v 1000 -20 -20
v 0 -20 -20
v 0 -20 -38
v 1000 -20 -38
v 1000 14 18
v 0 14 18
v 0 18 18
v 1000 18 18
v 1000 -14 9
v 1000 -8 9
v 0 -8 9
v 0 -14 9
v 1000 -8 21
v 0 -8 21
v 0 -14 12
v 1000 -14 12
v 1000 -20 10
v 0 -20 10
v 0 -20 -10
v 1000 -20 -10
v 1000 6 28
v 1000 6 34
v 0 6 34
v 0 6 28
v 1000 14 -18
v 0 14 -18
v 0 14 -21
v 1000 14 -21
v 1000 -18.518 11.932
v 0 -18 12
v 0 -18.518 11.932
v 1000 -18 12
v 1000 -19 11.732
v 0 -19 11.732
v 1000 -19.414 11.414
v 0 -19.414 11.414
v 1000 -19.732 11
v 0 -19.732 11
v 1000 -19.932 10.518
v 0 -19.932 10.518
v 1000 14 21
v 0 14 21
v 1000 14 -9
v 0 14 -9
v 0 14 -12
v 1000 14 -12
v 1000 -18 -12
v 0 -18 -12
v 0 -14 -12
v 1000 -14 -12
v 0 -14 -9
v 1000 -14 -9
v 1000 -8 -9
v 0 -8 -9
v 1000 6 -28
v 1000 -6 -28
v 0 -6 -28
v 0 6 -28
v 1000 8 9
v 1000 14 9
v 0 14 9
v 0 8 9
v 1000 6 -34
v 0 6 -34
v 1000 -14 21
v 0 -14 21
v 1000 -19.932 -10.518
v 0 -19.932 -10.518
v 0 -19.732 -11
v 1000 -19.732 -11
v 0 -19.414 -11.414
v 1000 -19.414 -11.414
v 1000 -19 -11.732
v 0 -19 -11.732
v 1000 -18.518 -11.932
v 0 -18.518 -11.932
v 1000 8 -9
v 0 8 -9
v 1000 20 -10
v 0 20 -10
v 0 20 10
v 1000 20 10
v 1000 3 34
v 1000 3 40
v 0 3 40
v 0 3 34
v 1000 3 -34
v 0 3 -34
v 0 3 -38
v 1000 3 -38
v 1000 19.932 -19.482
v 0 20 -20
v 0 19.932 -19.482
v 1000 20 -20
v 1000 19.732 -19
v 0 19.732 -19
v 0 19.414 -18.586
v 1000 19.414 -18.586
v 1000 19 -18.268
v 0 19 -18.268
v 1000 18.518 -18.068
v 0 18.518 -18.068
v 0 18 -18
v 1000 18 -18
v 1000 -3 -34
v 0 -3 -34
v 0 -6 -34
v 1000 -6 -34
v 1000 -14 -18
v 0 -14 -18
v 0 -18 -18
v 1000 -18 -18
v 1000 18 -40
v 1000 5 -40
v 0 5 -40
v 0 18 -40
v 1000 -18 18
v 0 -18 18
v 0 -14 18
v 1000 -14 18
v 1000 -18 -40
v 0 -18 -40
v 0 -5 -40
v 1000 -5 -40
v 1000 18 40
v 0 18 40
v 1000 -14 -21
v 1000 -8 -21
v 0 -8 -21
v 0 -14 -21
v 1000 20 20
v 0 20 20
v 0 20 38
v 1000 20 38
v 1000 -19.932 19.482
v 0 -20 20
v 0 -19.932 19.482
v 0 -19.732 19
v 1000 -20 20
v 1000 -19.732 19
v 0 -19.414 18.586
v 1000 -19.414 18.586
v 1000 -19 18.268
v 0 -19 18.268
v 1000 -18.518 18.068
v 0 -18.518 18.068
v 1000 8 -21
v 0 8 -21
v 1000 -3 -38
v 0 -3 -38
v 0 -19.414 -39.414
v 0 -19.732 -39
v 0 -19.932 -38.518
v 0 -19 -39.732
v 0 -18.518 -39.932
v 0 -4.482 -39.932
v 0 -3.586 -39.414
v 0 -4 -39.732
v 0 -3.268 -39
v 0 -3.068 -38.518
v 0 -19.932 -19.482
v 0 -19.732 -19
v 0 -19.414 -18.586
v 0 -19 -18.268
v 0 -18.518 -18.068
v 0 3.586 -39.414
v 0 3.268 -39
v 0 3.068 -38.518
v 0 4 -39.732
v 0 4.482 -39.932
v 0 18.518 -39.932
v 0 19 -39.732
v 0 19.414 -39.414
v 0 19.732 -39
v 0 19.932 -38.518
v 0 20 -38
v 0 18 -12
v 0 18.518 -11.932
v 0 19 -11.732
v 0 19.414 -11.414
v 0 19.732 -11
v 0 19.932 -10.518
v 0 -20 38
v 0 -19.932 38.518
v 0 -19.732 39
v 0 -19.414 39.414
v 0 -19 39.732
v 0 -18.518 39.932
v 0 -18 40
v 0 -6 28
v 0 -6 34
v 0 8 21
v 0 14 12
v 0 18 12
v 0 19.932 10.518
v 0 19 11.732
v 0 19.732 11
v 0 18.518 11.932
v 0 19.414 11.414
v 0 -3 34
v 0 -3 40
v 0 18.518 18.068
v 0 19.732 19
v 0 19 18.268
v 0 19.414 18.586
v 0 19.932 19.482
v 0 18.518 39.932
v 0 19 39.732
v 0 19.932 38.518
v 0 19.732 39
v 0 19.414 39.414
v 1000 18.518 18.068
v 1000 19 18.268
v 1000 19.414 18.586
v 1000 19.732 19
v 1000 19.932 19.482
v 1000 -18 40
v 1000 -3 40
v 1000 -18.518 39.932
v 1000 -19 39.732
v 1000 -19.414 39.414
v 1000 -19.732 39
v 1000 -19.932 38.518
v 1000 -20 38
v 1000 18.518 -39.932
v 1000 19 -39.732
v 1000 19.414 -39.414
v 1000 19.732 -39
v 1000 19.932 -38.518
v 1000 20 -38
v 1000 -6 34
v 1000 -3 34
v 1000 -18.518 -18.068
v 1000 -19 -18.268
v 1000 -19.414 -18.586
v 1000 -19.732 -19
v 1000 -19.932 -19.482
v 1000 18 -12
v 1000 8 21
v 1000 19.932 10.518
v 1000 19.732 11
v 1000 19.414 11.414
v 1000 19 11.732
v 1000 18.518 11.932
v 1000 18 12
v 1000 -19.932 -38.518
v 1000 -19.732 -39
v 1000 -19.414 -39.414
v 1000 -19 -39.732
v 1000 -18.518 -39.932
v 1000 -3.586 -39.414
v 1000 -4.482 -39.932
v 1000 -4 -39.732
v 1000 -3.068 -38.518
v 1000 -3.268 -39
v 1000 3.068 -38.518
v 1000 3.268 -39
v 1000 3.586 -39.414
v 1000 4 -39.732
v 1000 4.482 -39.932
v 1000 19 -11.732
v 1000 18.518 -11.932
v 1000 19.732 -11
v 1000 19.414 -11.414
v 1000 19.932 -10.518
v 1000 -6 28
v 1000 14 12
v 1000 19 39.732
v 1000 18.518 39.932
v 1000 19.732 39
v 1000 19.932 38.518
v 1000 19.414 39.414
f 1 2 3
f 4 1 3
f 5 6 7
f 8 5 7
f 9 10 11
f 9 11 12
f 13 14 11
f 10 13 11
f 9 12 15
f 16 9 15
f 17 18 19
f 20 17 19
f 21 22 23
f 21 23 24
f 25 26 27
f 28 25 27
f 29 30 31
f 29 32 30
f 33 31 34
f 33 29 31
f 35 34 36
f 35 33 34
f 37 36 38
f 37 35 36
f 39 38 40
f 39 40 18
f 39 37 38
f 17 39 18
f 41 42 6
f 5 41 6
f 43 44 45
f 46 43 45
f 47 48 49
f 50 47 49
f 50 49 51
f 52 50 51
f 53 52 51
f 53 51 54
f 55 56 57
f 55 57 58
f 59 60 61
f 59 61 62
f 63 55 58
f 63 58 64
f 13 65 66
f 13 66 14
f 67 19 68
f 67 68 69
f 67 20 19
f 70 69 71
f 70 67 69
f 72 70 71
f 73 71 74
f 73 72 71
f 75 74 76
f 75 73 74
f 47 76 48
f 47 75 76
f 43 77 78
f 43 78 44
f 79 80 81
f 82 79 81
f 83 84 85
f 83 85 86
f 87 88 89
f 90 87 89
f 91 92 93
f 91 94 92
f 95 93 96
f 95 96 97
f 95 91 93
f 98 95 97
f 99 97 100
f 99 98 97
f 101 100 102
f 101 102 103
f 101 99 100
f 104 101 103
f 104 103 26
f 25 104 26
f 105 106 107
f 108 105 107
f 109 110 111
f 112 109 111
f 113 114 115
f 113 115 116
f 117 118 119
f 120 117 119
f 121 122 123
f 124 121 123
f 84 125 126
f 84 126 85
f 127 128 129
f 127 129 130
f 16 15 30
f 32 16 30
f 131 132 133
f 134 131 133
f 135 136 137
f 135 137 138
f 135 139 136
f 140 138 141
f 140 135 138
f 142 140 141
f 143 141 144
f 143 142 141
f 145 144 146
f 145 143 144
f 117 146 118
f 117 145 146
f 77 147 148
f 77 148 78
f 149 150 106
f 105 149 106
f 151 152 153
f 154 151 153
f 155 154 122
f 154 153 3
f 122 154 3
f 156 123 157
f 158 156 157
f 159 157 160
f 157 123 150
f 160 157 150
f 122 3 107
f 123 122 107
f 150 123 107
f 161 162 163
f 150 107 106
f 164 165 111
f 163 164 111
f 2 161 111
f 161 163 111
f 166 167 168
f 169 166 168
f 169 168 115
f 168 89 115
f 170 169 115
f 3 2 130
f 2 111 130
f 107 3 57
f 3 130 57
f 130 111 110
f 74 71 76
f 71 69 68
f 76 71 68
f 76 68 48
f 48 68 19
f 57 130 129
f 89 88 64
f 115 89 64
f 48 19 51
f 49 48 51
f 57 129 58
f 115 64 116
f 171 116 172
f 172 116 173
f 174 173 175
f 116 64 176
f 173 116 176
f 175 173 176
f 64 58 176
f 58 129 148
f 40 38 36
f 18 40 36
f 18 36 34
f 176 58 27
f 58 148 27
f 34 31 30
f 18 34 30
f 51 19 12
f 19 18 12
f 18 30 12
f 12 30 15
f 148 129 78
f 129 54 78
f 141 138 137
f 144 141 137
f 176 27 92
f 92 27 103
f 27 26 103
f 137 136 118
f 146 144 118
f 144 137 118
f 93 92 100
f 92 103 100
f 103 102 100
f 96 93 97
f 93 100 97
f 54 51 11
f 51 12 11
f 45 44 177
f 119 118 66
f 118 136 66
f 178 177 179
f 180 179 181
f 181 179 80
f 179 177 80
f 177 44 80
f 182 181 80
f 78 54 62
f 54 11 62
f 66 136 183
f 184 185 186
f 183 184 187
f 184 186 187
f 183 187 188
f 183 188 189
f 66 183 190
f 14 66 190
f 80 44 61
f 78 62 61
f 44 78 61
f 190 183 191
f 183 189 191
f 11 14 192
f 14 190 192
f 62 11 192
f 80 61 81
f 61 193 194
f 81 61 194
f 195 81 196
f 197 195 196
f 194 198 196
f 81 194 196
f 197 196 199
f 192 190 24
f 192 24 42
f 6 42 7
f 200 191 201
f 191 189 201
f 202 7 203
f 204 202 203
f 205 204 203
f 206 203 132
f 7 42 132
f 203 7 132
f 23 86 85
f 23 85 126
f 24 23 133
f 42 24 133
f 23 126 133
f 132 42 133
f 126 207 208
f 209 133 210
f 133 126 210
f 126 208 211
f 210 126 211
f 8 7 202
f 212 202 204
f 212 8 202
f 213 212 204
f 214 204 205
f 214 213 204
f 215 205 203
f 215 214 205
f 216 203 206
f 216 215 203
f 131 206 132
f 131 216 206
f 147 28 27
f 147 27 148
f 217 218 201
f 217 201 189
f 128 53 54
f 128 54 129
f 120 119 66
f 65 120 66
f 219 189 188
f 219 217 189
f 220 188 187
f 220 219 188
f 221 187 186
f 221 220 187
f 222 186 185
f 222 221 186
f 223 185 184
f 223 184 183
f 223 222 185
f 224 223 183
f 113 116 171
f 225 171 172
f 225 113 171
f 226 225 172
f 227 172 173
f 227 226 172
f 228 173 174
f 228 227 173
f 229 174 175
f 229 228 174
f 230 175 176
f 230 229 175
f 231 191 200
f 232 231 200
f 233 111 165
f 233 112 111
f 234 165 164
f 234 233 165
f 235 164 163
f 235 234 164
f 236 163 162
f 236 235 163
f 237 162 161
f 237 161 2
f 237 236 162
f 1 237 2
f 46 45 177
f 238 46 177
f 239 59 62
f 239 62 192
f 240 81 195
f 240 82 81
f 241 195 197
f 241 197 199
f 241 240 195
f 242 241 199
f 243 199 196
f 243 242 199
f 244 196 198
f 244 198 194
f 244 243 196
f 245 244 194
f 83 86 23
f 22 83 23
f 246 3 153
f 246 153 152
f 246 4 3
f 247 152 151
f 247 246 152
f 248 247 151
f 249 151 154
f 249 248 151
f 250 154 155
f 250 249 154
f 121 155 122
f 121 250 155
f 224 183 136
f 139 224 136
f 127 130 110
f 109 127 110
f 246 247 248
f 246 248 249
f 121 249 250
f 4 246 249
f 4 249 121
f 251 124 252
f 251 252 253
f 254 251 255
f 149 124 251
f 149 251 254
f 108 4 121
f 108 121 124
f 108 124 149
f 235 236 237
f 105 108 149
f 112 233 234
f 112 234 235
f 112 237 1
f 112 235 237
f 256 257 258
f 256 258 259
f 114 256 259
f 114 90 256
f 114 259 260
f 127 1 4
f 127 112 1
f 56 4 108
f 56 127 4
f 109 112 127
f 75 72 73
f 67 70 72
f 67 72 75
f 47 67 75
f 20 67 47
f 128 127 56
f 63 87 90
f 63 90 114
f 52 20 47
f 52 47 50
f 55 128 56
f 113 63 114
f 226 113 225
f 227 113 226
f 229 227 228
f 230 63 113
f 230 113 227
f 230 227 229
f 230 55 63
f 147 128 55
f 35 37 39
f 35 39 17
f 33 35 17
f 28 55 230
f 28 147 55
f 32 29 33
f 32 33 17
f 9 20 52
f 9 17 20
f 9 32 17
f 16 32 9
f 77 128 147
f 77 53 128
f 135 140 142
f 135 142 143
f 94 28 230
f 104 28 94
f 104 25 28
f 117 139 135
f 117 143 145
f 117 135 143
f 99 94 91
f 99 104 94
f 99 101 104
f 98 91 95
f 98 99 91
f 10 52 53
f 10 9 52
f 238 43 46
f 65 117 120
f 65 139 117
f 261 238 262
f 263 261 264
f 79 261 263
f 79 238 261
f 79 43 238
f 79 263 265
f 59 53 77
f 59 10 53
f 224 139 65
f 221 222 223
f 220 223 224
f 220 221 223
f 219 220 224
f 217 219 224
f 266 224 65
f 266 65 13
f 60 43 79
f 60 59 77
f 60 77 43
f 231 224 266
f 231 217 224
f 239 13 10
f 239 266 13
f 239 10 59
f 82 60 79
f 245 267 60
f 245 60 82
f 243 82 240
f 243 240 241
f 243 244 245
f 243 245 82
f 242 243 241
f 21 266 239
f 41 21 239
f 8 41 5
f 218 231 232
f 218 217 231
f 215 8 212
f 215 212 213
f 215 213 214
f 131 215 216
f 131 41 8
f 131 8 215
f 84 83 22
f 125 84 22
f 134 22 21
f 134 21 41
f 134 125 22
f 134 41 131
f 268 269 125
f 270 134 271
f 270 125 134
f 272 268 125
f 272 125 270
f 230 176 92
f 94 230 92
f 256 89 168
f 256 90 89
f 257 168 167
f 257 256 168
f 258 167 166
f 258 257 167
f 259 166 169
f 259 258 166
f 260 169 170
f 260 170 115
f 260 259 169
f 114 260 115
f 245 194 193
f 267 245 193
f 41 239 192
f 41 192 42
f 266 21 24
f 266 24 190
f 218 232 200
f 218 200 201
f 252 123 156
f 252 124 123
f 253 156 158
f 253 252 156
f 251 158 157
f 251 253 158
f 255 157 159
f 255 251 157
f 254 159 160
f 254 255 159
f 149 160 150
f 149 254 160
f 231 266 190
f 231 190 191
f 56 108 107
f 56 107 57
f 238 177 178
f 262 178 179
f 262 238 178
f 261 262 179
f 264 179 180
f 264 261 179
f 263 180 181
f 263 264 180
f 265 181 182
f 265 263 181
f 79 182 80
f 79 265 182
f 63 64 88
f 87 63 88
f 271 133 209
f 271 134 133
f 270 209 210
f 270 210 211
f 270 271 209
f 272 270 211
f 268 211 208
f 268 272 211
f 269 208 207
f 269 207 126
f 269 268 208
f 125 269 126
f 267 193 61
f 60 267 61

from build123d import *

# Parameters (mm, degrees)
F1_DEPTH = 1000
F2_R     = 2


with BuildPart() as f1:
    # F0 (on Right) → F1 (new body)
    with BuildSketch(Plane.YZ):
        Polygon((-3, 40), (-20, 40), (-20, 18), (-14.000001, 18), (-14.000001, 21), (-8.000001, 21), (-8, 9), (-14, 9), (-14, 12), (-20, 12), (-20, -12), (-14, -12), (-14, -9), (-8, -9), (-8, -21), (-14, -21), (-14, -18), (-20, -18), (-20, -40), (-3, -40), (-3.000028, -34), (-6.000028, -34), (-6.000028, -28), (5.999972, -28), (5.999972, -34), (2.999972, -34), (3, -40), (20, -40), (20, -18), (14, -18), (14, -21), (8, -21), (8, -9), (14, -9), (14, -12), (20, -12), (20, 12), (14, 12), (14, 9), (8, 9), (8, 21), (14, 21), (14, 18), (20, 18), (20, 40), (3, 40), (3, 34), (6, 34), (6, 28), (-6, 28), (-6, 34), (-3, 34), align=None)
    extrude(amount=F1_DEPTH)

    # F2
    f2_edges = [f1.edges().sort_by_distance(p)[0] for p in [
        (500, -20, 40),
        (500, -20, 18),
        (500, -20, 12),
        (500, -20, -12),
        (500, -20, -18),
        (500, -20, -40),
        (500, -3, -40),
        (500, 3, -40),
        (500, 20, -40),
        (500, 20, -18),
        (500, 20, 12),
        (500, 20, -12),
        (500, 20, 40),
        (500, 20, 18),
    ]]
    fillet(f2_edges, radius=F2_R)


solid = f1.part
